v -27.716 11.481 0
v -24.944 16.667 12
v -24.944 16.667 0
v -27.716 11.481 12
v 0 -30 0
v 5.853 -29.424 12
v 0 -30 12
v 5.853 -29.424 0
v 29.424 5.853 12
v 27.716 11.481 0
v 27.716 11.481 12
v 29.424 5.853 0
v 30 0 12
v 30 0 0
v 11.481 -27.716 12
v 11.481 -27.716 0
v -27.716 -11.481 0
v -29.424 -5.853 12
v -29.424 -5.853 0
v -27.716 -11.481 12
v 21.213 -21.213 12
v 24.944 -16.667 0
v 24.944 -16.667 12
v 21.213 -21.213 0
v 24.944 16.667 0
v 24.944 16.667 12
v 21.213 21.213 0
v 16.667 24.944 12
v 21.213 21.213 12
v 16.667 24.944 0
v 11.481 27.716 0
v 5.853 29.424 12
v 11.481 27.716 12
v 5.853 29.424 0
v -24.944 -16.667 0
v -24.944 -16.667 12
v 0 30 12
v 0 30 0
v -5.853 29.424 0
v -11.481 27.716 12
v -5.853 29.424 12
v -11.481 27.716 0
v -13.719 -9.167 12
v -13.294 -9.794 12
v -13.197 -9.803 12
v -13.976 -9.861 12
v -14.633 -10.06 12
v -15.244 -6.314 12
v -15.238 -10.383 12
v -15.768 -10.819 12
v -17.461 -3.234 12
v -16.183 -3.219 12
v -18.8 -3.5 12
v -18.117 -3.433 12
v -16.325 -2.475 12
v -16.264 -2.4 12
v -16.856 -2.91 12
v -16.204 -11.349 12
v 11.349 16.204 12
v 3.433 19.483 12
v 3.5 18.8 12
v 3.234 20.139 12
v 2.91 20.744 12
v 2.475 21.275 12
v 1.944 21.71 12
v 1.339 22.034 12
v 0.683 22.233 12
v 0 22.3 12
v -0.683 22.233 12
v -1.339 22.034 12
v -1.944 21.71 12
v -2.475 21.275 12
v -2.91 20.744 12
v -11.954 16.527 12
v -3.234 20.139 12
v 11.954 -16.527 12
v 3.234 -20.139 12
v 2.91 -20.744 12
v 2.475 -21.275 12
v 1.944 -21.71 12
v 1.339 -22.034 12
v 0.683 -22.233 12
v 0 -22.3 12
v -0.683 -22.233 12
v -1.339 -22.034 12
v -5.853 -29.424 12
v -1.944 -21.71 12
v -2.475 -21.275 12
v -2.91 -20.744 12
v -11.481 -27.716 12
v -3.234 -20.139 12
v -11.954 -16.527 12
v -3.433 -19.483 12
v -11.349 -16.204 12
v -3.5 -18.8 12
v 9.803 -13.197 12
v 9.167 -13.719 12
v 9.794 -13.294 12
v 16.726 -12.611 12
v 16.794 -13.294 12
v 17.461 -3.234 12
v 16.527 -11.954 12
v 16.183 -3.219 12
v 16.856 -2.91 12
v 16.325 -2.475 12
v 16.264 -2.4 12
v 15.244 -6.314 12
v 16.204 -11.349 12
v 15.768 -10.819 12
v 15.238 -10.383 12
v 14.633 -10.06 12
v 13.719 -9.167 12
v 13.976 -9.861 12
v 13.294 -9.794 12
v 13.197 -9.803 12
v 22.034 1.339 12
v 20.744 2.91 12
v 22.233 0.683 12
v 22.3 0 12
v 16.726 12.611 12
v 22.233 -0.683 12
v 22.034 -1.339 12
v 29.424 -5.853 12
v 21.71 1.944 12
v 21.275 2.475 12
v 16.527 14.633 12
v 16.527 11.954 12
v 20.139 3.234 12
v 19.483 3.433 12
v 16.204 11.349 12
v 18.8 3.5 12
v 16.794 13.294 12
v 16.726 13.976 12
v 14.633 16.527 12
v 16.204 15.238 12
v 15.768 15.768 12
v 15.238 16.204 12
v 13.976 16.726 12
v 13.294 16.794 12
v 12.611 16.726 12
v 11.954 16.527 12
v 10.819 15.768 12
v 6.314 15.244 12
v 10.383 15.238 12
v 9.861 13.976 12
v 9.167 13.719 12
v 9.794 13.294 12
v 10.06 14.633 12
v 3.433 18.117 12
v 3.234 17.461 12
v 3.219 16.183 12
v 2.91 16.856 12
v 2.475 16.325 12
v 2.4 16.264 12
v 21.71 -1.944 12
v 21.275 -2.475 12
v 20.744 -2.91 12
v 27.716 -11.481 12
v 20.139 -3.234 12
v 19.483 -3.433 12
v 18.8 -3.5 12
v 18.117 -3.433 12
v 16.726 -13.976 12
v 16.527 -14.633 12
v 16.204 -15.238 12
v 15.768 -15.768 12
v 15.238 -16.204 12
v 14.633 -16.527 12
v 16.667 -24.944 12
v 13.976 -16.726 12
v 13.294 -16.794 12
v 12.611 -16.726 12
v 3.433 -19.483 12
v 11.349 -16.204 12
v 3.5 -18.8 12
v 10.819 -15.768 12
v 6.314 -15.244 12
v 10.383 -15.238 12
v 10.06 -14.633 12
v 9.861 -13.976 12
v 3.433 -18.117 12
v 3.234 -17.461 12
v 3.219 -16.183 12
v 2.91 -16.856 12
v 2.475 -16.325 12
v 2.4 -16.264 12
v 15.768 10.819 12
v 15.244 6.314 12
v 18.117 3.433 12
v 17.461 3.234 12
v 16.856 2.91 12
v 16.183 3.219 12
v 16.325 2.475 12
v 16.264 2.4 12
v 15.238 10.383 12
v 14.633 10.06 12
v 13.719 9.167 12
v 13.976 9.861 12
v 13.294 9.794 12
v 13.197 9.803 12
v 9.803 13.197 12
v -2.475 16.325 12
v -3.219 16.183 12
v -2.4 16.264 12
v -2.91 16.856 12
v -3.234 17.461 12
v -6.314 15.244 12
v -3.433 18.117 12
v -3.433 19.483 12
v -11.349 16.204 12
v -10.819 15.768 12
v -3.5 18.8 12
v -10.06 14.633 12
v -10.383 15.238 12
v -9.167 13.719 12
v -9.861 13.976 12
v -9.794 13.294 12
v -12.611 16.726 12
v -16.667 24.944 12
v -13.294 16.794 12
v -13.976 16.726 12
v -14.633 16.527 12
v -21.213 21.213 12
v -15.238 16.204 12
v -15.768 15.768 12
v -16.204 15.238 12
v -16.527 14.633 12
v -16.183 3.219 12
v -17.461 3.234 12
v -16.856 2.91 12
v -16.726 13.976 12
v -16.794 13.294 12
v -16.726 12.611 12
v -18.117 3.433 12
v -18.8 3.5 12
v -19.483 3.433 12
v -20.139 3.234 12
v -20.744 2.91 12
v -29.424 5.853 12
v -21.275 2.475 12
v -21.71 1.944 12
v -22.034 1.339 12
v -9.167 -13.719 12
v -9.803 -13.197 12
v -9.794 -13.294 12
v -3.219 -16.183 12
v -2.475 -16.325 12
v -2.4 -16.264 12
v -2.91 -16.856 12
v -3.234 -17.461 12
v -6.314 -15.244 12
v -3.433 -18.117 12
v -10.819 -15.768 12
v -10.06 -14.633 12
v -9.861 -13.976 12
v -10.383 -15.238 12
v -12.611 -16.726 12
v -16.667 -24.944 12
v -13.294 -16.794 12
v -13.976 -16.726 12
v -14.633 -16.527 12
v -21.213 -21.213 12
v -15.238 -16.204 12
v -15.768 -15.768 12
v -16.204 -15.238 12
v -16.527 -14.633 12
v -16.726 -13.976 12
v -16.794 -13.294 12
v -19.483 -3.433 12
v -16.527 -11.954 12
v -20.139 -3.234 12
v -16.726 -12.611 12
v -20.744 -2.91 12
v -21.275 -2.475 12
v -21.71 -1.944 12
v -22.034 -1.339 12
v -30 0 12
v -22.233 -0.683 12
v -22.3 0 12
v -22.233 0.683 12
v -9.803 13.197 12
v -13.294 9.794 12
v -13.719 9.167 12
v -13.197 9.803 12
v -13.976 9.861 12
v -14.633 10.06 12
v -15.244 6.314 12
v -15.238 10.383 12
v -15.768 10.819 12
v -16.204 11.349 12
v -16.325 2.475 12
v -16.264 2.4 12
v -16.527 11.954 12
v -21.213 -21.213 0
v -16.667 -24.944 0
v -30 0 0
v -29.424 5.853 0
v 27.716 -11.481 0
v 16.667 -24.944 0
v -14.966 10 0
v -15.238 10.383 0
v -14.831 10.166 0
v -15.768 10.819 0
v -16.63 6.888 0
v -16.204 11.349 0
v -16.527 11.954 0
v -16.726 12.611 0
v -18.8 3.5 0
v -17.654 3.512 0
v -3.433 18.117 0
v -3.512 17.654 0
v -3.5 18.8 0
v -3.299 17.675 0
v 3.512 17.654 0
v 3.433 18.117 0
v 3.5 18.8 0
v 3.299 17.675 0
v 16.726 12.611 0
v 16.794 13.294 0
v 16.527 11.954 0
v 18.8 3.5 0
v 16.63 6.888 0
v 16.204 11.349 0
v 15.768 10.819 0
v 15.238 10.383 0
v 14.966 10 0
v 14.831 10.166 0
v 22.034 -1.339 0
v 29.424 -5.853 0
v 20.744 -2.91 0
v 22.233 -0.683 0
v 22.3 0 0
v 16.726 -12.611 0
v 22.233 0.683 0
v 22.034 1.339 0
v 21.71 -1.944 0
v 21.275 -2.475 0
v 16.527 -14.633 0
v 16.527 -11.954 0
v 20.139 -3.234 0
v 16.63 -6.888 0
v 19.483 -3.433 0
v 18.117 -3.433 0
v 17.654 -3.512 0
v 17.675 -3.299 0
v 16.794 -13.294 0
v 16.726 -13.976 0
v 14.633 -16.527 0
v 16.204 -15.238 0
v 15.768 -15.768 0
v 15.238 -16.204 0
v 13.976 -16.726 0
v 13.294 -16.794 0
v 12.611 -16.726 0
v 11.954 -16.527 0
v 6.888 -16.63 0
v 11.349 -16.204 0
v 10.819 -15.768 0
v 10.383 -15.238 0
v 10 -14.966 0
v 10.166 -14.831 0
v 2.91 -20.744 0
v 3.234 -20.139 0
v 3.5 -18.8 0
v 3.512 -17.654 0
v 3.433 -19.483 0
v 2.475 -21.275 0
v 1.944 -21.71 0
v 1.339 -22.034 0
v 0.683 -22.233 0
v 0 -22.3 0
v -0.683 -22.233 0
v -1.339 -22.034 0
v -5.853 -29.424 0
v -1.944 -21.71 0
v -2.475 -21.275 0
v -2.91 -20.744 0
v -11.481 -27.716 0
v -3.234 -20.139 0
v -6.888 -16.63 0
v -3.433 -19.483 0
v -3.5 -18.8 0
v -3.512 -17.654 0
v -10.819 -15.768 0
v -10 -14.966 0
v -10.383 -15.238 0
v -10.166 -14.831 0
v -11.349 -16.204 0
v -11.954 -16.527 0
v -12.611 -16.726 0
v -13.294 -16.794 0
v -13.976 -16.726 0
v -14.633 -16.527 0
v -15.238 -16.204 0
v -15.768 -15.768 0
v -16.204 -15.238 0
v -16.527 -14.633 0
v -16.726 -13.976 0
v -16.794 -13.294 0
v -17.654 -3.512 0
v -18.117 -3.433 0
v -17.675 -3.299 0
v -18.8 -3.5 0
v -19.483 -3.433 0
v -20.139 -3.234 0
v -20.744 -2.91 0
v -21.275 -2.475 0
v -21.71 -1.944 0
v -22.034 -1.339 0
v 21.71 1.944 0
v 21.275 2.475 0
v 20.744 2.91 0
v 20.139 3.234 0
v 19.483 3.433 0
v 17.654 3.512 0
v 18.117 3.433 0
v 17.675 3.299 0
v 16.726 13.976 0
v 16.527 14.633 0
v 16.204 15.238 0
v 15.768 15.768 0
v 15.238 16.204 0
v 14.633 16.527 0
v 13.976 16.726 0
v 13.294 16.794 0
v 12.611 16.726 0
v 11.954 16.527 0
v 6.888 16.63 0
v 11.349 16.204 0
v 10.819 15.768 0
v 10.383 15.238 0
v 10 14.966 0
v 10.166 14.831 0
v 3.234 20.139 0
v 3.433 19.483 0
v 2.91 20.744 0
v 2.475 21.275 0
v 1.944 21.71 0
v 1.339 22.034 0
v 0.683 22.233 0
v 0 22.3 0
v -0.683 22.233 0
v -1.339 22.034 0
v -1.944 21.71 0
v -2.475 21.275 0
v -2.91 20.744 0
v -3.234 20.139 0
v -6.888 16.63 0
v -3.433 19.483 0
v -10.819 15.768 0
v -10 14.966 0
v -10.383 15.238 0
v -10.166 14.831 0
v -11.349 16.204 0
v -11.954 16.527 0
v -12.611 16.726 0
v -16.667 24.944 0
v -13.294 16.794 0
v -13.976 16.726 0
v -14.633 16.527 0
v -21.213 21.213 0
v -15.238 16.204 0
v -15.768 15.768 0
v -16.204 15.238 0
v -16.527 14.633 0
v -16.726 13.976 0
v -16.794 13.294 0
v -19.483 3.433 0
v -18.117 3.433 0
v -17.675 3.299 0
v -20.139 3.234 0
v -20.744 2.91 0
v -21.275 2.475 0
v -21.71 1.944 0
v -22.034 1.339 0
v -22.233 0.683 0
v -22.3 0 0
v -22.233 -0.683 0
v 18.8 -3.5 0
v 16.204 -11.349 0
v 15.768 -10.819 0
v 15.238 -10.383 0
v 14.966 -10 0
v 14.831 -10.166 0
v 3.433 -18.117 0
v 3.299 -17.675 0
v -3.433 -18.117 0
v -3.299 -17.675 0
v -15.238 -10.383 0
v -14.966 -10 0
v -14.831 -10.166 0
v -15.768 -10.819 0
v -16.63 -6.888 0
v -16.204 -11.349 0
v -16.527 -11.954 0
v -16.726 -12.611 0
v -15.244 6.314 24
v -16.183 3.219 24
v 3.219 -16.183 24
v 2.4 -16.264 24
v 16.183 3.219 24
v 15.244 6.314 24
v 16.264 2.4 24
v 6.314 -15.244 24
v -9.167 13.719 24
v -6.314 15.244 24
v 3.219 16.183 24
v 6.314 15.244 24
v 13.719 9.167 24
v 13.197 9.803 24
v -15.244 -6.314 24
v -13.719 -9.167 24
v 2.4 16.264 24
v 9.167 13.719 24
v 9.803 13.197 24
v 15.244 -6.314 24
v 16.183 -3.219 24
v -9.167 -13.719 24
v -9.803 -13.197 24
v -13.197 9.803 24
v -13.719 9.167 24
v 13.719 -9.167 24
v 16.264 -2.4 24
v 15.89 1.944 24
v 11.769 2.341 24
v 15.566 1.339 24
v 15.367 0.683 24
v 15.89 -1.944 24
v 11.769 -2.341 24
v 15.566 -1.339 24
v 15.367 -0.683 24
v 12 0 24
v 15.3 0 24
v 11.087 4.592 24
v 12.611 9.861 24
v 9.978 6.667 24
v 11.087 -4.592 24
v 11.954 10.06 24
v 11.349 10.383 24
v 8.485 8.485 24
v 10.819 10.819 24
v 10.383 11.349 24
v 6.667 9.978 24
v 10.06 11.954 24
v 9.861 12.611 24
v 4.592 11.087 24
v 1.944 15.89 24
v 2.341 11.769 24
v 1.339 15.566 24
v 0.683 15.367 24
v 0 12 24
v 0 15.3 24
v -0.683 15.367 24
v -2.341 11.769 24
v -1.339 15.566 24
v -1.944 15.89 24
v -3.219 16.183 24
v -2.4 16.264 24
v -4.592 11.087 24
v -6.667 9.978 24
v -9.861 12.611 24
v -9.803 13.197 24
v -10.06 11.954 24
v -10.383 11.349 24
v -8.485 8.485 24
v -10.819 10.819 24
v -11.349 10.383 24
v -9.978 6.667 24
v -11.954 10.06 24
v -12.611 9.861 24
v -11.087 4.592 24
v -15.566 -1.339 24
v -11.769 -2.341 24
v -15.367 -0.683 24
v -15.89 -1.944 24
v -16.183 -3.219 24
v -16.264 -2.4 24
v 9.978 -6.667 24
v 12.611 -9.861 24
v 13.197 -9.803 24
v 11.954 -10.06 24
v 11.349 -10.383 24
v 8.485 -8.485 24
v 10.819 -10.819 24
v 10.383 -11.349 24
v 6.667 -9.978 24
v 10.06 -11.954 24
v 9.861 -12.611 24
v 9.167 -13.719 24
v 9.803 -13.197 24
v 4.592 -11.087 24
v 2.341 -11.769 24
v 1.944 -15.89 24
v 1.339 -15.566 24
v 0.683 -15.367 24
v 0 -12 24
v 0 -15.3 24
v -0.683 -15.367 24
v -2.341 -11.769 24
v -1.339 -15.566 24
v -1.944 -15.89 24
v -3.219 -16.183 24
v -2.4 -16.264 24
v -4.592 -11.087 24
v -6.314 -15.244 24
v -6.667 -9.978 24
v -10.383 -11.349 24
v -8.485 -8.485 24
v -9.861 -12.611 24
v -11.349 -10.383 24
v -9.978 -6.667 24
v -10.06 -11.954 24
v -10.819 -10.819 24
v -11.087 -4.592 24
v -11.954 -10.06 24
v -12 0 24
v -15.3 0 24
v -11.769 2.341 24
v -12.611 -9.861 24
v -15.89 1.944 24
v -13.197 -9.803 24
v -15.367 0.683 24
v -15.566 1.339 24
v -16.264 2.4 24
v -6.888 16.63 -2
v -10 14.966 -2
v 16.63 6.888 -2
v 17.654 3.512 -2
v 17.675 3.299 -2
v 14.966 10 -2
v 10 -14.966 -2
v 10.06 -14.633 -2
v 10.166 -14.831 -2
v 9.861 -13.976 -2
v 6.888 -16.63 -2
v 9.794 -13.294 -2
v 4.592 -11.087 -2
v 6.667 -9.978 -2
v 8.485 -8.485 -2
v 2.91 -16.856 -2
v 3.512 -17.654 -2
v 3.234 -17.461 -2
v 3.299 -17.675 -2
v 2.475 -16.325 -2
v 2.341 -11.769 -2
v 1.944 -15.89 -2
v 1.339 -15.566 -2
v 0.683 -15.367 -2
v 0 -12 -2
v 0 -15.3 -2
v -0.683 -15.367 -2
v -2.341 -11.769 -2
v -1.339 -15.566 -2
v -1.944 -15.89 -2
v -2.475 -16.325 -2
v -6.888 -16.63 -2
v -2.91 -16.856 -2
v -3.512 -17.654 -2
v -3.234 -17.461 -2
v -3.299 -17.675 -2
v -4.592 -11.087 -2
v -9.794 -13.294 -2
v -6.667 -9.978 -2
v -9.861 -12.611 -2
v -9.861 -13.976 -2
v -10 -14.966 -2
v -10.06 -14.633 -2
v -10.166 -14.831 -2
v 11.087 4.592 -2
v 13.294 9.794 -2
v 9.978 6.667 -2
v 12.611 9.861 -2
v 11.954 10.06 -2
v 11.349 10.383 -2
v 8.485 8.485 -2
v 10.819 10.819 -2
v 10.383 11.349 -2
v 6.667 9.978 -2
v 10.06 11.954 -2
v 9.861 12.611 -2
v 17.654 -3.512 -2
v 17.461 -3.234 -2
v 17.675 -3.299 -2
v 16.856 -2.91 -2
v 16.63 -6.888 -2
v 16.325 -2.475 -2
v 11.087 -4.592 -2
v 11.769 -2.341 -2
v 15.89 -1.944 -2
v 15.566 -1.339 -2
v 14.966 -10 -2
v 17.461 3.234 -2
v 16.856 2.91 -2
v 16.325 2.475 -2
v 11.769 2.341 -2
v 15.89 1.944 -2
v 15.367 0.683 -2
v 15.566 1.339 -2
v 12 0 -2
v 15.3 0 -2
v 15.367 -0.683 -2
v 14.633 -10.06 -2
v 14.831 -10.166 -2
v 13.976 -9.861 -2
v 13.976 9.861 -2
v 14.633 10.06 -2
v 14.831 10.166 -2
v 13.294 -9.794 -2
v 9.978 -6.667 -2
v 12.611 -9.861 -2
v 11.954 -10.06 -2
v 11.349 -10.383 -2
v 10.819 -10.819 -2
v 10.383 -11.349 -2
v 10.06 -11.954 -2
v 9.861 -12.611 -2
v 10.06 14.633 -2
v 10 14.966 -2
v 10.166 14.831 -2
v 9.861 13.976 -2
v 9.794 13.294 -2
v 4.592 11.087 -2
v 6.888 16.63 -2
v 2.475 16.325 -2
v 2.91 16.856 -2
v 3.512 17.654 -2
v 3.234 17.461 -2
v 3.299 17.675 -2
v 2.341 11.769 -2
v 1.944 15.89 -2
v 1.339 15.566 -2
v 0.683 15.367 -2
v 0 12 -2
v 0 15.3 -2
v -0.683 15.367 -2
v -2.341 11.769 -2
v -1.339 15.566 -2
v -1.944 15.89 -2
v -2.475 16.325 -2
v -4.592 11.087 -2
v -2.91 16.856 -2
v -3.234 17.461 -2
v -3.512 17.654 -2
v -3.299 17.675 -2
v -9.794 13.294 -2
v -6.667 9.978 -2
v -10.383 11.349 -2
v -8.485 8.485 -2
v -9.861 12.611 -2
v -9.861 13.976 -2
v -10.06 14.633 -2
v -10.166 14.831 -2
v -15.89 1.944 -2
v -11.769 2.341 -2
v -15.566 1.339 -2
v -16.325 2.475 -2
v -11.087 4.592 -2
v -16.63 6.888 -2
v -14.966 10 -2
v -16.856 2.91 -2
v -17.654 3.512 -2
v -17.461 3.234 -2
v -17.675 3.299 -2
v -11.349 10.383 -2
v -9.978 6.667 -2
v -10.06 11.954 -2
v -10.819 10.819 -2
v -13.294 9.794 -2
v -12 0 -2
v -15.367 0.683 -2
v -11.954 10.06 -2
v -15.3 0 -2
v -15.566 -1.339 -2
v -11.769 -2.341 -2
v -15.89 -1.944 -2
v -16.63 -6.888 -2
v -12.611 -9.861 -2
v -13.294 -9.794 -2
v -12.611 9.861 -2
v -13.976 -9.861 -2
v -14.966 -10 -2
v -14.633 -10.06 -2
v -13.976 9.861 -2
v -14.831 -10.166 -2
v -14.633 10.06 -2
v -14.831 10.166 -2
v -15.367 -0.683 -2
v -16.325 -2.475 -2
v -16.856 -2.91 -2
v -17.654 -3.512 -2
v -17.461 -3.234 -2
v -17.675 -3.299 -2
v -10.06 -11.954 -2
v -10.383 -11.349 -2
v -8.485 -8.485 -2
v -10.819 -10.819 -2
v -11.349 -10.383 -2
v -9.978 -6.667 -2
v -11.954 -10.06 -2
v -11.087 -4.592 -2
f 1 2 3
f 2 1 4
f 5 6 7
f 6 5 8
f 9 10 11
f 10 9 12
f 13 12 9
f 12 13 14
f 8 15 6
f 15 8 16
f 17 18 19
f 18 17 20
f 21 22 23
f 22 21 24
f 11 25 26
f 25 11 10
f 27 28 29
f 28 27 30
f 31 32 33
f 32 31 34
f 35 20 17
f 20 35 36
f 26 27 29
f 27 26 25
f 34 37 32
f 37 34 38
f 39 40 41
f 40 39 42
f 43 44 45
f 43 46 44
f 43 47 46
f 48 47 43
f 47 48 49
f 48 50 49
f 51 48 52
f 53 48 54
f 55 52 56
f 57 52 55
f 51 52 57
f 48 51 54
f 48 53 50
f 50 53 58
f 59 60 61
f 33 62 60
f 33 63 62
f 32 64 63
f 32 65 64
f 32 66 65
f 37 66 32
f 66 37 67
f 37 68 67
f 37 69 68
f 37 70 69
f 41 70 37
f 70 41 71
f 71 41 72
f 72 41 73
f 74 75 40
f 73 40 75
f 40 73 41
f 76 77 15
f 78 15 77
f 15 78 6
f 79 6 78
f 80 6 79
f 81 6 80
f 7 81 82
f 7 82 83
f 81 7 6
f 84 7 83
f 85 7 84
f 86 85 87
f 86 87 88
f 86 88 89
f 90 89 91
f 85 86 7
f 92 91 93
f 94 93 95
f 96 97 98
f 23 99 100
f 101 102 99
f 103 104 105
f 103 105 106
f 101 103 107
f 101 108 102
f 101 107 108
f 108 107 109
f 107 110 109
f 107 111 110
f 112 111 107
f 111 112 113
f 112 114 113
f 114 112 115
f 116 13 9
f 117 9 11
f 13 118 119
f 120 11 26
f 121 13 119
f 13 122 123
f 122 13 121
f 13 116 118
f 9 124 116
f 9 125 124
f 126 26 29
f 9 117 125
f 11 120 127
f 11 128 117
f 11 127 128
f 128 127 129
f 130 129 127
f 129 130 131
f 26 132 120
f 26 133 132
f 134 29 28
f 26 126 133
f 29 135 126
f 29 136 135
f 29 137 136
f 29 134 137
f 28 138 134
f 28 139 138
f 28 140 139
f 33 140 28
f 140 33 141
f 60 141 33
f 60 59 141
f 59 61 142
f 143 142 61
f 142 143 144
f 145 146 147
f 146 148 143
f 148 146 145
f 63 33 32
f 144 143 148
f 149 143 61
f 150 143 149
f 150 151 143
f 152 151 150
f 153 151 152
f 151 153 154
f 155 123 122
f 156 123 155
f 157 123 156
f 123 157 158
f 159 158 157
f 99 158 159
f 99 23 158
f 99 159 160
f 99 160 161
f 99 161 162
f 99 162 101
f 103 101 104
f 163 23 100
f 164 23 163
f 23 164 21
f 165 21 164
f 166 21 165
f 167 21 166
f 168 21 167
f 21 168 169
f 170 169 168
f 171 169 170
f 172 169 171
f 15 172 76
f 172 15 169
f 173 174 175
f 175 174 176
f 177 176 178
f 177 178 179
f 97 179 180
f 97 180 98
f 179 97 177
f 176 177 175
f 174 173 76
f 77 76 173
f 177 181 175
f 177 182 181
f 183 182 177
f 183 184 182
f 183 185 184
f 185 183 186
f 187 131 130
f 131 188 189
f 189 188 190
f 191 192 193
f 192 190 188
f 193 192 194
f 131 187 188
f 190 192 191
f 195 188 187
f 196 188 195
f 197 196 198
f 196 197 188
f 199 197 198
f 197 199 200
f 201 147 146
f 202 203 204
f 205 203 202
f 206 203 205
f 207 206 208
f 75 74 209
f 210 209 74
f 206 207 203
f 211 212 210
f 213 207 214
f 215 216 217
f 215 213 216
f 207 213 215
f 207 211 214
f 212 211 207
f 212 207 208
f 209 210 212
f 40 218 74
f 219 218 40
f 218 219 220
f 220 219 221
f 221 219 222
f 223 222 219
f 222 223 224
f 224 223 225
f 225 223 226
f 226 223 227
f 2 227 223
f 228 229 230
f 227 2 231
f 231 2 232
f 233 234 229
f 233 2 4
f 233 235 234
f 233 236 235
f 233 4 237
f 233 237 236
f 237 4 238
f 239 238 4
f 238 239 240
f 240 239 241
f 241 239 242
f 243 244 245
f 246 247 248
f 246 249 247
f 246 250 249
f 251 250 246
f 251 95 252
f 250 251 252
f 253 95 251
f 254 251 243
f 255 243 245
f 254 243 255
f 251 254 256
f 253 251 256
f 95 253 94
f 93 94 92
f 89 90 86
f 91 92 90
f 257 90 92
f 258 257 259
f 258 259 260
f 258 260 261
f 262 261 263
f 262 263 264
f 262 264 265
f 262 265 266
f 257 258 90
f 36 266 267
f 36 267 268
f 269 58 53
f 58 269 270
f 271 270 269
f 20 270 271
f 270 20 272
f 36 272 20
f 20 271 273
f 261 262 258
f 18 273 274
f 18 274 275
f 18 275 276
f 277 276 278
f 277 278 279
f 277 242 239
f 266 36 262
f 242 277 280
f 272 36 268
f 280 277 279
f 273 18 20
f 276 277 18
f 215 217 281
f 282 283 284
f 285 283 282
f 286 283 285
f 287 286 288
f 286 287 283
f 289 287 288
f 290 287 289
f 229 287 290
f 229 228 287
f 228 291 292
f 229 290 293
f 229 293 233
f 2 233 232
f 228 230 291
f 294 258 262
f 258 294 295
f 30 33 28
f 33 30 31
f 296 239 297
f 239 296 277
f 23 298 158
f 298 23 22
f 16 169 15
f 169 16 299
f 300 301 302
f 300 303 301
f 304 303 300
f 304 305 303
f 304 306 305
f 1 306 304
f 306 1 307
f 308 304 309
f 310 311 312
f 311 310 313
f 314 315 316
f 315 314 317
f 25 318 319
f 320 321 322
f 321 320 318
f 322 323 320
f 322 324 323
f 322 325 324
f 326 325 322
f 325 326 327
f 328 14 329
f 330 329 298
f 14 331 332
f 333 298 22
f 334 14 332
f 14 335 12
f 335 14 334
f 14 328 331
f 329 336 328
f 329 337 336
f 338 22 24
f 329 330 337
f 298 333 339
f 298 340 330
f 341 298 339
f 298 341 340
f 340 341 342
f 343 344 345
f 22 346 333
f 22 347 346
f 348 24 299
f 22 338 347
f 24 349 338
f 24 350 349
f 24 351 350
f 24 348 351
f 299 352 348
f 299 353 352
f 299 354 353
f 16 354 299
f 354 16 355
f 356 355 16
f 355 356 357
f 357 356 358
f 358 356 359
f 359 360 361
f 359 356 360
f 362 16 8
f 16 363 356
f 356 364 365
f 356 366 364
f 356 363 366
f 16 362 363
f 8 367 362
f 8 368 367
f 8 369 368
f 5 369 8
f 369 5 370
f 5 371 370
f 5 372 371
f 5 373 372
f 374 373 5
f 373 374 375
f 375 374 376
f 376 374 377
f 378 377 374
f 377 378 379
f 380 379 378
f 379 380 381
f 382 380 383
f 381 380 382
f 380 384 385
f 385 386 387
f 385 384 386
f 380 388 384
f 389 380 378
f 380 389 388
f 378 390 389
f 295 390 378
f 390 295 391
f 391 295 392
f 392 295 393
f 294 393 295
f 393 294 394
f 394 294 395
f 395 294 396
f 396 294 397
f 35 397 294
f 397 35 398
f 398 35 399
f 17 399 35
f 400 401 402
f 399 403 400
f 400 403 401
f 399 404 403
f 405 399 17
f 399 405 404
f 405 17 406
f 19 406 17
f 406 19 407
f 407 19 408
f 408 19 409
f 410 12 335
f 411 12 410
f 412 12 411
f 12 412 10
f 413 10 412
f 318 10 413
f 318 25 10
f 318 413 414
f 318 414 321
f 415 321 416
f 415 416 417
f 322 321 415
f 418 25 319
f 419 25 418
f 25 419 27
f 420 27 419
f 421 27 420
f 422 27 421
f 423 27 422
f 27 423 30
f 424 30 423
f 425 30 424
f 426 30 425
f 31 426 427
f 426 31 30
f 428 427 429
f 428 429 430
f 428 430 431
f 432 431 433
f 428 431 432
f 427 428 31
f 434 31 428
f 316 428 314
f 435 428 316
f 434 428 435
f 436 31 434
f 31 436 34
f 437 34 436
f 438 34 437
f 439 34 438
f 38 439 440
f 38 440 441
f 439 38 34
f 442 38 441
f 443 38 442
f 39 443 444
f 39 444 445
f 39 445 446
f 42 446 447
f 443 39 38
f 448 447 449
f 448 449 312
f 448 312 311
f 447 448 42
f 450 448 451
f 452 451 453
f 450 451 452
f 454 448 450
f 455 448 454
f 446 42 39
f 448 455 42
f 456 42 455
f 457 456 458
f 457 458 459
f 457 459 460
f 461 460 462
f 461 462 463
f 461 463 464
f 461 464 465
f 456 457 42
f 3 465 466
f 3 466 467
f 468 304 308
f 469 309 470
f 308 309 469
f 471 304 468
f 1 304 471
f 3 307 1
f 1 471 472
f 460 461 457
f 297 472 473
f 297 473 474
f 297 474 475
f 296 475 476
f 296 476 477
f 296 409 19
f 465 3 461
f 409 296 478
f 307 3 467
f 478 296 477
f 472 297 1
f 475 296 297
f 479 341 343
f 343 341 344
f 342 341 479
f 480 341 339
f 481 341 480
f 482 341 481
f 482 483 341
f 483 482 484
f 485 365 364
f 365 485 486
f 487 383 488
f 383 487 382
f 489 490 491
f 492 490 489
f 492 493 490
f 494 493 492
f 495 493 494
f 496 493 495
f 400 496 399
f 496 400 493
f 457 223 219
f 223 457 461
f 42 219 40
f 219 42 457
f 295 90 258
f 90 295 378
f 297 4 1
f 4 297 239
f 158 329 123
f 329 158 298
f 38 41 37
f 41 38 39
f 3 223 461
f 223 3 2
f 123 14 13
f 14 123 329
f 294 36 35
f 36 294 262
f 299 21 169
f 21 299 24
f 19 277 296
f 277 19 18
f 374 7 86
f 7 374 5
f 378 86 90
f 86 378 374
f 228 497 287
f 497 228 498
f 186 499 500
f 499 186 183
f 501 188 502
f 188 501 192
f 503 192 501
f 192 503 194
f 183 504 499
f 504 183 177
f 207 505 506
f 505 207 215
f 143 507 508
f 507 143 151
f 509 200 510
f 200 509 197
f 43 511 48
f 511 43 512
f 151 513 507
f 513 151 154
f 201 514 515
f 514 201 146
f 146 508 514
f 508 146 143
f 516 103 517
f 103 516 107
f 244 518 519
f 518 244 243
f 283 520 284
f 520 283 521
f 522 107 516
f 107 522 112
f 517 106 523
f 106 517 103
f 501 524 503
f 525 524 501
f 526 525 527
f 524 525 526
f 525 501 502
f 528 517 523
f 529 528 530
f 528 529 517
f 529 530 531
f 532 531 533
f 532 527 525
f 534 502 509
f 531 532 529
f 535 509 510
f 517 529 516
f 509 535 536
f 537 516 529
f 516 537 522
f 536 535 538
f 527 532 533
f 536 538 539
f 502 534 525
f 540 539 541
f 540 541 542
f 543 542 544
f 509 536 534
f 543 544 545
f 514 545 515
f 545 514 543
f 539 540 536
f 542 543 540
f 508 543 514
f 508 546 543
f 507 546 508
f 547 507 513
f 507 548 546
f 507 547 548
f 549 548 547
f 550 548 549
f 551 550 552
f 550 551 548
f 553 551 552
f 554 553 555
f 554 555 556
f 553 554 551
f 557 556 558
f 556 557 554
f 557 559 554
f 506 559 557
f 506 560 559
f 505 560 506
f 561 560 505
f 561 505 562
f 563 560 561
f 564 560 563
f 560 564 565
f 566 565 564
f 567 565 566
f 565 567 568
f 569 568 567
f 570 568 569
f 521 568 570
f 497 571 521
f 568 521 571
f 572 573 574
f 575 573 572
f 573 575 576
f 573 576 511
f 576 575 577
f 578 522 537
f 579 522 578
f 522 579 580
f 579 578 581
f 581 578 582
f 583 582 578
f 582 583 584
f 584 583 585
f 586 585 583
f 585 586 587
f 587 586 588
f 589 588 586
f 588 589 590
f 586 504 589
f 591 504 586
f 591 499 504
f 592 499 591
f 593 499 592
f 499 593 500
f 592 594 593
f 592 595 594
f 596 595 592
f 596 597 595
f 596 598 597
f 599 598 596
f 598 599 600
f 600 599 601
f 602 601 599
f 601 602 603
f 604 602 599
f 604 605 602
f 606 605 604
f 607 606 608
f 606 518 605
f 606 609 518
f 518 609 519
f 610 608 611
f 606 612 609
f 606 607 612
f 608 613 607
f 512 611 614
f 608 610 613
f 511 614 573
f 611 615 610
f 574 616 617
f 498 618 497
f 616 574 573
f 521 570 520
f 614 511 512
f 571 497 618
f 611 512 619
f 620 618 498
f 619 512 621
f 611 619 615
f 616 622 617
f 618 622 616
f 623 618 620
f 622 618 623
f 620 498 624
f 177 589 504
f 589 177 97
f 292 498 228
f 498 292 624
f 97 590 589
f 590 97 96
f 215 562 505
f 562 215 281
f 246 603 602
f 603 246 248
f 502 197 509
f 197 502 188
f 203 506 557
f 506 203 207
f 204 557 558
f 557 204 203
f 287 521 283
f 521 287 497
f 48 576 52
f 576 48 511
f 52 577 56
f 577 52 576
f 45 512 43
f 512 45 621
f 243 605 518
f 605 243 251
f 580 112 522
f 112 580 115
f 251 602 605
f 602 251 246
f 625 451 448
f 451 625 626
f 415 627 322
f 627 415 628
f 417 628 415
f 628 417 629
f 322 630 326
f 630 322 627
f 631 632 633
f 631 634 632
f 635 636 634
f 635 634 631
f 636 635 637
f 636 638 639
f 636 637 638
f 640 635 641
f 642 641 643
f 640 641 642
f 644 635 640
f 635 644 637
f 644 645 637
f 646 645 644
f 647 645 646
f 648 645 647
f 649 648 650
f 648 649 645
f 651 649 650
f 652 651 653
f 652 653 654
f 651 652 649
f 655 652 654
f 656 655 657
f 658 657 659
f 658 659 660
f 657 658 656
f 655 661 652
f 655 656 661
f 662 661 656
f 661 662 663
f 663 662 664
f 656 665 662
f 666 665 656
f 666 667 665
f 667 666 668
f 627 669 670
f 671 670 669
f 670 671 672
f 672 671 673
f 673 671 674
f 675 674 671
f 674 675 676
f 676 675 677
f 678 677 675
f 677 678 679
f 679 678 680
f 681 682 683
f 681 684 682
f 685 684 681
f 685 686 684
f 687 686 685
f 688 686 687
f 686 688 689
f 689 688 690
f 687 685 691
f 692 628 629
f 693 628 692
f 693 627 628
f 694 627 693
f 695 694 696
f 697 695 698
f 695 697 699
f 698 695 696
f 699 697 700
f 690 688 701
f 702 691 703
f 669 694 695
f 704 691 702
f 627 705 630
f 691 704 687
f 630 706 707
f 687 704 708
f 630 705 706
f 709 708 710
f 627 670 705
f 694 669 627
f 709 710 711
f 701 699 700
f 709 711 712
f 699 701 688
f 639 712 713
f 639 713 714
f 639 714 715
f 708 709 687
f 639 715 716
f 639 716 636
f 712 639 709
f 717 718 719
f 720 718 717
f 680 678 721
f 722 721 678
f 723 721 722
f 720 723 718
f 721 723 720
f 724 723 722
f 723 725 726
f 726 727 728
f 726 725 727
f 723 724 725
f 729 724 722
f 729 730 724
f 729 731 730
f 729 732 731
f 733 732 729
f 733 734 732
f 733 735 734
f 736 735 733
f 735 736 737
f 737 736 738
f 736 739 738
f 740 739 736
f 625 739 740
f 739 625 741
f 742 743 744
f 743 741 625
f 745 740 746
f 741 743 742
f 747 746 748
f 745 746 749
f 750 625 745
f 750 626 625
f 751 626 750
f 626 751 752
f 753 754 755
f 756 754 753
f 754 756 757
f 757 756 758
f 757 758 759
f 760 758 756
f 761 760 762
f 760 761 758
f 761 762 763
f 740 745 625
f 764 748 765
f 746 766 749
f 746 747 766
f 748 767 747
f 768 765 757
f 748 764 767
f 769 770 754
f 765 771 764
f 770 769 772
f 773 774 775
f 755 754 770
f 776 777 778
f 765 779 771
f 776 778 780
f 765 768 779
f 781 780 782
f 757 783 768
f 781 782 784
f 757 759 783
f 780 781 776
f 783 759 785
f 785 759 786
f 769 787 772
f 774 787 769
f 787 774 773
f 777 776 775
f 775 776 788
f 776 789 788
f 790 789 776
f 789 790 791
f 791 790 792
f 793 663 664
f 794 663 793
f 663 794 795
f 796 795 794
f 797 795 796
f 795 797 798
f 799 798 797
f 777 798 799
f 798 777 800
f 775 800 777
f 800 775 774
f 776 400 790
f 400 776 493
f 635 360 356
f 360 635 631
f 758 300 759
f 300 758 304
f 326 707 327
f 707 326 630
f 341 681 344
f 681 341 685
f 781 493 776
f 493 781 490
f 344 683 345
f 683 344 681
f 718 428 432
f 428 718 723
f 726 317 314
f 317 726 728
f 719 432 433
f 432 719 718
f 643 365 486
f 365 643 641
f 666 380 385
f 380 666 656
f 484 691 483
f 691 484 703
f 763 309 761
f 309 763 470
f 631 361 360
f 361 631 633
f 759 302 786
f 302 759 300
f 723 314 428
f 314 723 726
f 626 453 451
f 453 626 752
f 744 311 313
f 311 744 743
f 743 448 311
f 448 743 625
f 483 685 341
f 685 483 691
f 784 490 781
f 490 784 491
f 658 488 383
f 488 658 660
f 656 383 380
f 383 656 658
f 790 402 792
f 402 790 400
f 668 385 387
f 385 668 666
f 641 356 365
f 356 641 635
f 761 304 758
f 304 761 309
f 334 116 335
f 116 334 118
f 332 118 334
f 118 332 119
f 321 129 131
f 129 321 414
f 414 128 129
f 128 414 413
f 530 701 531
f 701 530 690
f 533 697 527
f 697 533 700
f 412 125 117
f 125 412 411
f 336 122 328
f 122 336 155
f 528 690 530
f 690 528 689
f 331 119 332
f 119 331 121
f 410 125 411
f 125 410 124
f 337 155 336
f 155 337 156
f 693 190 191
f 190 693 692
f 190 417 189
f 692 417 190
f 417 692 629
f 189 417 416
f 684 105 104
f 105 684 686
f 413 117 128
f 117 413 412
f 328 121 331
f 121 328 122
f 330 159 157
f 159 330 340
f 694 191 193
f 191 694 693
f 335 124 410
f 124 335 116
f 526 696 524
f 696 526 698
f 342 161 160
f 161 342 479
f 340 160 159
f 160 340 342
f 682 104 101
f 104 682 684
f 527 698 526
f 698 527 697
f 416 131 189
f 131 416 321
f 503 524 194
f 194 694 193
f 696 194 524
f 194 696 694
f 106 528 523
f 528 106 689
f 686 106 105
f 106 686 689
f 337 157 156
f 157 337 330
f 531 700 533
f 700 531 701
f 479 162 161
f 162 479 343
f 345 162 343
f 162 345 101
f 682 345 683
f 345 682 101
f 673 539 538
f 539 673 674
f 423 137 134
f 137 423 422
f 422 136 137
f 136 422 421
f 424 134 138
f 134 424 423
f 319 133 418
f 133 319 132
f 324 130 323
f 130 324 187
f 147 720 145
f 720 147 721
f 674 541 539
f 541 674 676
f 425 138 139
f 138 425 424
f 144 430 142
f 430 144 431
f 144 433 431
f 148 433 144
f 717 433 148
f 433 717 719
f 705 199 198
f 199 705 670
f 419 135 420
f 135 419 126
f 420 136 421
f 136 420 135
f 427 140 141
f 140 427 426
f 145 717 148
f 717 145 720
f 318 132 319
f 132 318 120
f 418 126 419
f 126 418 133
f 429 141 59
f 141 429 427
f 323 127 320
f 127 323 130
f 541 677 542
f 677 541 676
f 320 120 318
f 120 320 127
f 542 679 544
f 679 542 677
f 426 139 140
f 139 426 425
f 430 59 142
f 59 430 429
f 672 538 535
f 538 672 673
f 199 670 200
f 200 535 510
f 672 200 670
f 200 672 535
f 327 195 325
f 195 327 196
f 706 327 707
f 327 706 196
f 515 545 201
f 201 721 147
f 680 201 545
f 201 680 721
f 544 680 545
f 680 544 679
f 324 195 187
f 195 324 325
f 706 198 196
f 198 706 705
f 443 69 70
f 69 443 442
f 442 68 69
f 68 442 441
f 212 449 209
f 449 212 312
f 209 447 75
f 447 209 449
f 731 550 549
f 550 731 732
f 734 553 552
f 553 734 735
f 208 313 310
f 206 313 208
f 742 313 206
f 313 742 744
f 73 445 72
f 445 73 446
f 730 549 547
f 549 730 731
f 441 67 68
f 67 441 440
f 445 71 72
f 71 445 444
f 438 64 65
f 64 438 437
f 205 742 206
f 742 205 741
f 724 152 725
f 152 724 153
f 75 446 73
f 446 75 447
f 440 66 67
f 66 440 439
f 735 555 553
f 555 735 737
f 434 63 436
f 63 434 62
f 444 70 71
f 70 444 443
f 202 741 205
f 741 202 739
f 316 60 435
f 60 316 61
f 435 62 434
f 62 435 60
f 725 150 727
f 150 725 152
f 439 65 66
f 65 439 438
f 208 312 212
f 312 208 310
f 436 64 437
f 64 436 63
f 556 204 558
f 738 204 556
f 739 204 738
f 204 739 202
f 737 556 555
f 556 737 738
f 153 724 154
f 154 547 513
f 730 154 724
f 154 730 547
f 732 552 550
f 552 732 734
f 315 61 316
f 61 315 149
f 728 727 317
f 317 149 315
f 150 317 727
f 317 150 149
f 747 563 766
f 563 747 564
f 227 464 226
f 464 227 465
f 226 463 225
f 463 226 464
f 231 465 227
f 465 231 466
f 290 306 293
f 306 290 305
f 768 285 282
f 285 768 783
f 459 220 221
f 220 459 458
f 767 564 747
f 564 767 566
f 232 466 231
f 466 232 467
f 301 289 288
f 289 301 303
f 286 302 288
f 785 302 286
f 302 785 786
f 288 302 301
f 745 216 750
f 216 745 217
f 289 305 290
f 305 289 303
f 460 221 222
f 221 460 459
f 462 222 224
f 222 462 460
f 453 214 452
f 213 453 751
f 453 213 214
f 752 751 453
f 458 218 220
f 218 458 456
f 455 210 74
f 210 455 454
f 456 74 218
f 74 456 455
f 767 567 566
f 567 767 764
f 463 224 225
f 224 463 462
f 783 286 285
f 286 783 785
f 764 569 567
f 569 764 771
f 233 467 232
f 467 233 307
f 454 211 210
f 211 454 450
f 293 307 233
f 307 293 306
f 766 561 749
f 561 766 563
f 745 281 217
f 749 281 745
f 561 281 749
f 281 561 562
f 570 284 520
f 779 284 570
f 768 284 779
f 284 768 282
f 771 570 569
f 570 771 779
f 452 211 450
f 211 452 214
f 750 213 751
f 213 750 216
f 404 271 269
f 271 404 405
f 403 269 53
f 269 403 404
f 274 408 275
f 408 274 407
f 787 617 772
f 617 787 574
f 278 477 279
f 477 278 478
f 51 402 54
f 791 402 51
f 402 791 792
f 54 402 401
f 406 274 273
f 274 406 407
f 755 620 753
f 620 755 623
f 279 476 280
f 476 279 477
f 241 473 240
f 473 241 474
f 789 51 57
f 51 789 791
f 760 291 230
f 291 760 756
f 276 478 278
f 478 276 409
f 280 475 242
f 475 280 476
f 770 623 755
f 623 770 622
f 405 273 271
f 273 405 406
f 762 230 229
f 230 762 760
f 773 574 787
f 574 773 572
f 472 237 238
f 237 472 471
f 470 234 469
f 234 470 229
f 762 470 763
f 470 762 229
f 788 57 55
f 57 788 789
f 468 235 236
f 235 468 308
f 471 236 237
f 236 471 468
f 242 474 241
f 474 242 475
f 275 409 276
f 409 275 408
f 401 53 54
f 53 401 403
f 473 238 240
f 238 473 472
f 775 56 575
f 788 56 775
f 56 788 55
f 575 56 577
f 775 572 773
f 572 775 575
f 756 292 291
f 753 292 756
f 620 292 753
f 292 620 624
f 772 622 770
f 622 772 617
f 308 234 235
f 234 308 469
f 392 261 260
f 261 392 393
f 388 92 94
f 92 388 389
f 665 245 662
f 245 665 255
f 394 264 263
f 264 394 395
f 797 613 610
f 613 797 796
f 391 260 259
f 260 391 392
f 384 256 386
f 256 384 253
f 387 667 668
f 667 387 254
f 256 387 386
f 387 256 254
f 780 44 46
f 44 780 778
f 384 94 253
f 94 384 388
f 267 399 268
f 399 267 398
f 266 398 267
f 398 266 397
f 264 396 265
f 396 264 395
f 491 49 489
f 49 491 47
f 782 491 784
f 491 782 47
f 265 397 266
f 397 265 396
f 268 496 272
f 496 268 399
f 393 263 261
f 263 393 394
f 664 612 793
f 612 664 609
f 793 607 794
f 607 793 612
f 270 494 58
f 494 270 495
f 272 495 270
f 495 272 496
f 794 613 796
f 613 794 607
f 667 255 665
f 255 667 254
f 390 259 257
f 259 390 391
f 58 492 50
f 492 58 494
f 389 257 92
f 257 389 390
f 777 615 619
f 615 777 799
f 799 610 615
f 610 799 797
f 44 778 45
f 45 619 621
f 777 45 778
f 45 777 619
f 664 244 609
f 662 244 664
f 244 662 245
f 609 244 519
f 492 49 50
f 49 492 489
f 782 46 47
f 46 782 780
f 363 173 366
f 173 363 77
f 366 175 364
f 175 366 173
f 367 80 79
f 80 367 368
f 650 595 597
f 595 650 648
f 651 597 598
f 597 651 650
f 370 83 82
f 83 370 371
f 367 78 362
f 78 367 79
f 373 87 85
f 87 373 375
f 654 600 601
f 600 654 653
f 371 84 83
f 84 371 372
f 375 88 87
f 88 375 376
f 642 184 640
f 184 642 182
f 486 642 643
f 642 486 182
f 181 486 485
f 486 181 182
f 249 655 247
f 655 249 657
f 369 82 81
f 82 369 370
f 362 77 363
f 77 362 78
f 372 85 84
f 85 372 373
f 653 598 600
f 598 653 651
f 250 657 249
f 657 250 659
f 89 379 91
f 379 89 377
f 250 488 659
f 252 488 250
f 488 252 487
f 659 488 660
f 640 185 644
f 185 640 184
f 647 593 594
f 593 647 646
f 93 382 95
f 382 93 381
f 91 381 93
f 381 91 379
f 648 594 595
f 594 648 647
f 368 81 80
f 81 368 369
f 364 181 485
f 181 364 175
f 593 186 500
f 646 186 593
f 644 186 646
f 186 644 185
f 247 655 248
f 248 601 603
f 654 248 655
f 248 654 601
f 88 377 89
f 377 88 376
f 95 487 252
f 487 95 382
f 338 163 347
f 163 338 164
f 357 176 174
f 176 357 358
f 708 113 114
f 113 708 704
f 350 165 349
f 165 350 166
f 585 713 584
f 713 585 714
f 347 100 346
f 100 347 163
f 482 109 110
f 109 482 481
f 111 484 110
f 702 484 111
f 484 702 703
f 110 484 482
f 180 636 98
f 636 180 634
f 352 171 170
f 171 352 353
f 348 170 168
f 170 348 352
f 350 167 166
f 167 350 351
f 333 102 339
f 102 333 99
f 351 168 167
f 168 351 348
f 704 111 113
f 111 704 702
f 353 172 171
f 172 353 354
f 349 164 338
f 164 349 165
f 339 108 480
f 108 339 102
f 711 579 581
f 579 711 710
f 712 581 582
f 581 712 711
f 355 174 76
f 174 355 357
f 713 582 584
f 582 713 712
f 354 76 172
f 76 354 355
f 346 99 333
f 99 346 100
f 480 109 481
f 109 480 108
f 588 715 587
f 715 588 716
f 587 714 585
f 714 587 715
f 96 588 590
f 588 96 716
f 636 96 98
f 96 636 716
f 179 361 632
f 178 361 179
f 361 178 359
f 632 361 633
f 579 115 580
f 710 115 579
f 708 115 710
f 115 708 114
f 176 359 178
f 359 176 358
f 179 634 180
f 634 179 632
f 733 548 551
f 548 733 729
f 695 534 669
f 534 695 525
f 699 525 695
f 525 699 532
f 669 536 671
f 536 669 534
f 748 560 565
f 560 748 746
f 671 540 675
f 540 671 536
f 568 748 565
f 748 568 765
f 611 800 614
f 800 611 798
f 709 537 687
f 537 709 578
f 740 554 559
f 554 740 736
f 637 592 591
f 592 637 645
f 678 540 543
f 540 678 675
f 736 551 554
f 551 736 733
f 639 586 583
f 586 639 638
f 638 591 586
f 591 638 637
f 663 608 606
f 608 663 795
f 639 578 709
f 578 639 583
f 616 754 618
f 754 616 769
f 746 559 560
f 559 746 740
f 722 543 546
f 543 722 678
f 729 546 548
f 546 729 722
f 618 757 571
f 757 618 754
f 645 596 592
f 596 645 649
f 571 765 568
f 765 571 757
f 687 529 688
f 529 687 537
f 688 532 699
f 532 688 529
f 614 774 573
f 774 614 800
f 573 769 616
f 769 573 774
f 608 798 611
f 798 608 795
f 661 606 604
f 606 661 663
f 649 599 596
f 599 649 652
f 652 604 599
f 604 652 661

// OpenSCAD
$fn = 32;

// ----------------------------------------------------------------------
// Bolt-circle flange: 60 mm outside, 8 bolt holes, bore 24 mm
// ----------------------------------------------------------------------

// --- parameters (mm) ---
flange_d = 60;            // flange outside diameter
flange_t = 12;            // flange thickness
bolts = 8;                // number of bolt holes
bolt_d = 7;               // bolt clearance
bolt_r = 18.8;            // bolt circle radius
bore_d = 24;              // centre bore
hub_d = 33;               // raised hub diameter
hub_h = 12;               // raised hub height
spigot_d = 36;            // spigot diameter
spigot_h = 3;             // spigot height below the flange
sink = 1;                 // overlap into the flange

module body() {
  cylinder(h = flange_t, d = flange_d);
  /* raised hub, sunk 1 mm into the flange */
  translate([0, 0, flange_t - 1]) cylinder(h = hub_h + 1, d = hub_d);
  /* spigot on the back face, sunk into the flange */
  translate([0, 0, -spigot_h + sink]) cylinder(h = spigot_h, d = spigot_d);
}

difference() {
  body();
  /* bolt circle */
  for (i = [0 : bolts - 1]) rotate([0, 0, i * 360 / bolts]) translate([bolt_r, 0, -spigot_h - 1]) cylinder(h = flange_t + hub_h + spigot_h + 3, d = bolt_d);
  translate([0, 0, -spigot_h - 1]) cylinder(h = flange_t + hub_h + spigot_h + 3, d = bore_d);
}
